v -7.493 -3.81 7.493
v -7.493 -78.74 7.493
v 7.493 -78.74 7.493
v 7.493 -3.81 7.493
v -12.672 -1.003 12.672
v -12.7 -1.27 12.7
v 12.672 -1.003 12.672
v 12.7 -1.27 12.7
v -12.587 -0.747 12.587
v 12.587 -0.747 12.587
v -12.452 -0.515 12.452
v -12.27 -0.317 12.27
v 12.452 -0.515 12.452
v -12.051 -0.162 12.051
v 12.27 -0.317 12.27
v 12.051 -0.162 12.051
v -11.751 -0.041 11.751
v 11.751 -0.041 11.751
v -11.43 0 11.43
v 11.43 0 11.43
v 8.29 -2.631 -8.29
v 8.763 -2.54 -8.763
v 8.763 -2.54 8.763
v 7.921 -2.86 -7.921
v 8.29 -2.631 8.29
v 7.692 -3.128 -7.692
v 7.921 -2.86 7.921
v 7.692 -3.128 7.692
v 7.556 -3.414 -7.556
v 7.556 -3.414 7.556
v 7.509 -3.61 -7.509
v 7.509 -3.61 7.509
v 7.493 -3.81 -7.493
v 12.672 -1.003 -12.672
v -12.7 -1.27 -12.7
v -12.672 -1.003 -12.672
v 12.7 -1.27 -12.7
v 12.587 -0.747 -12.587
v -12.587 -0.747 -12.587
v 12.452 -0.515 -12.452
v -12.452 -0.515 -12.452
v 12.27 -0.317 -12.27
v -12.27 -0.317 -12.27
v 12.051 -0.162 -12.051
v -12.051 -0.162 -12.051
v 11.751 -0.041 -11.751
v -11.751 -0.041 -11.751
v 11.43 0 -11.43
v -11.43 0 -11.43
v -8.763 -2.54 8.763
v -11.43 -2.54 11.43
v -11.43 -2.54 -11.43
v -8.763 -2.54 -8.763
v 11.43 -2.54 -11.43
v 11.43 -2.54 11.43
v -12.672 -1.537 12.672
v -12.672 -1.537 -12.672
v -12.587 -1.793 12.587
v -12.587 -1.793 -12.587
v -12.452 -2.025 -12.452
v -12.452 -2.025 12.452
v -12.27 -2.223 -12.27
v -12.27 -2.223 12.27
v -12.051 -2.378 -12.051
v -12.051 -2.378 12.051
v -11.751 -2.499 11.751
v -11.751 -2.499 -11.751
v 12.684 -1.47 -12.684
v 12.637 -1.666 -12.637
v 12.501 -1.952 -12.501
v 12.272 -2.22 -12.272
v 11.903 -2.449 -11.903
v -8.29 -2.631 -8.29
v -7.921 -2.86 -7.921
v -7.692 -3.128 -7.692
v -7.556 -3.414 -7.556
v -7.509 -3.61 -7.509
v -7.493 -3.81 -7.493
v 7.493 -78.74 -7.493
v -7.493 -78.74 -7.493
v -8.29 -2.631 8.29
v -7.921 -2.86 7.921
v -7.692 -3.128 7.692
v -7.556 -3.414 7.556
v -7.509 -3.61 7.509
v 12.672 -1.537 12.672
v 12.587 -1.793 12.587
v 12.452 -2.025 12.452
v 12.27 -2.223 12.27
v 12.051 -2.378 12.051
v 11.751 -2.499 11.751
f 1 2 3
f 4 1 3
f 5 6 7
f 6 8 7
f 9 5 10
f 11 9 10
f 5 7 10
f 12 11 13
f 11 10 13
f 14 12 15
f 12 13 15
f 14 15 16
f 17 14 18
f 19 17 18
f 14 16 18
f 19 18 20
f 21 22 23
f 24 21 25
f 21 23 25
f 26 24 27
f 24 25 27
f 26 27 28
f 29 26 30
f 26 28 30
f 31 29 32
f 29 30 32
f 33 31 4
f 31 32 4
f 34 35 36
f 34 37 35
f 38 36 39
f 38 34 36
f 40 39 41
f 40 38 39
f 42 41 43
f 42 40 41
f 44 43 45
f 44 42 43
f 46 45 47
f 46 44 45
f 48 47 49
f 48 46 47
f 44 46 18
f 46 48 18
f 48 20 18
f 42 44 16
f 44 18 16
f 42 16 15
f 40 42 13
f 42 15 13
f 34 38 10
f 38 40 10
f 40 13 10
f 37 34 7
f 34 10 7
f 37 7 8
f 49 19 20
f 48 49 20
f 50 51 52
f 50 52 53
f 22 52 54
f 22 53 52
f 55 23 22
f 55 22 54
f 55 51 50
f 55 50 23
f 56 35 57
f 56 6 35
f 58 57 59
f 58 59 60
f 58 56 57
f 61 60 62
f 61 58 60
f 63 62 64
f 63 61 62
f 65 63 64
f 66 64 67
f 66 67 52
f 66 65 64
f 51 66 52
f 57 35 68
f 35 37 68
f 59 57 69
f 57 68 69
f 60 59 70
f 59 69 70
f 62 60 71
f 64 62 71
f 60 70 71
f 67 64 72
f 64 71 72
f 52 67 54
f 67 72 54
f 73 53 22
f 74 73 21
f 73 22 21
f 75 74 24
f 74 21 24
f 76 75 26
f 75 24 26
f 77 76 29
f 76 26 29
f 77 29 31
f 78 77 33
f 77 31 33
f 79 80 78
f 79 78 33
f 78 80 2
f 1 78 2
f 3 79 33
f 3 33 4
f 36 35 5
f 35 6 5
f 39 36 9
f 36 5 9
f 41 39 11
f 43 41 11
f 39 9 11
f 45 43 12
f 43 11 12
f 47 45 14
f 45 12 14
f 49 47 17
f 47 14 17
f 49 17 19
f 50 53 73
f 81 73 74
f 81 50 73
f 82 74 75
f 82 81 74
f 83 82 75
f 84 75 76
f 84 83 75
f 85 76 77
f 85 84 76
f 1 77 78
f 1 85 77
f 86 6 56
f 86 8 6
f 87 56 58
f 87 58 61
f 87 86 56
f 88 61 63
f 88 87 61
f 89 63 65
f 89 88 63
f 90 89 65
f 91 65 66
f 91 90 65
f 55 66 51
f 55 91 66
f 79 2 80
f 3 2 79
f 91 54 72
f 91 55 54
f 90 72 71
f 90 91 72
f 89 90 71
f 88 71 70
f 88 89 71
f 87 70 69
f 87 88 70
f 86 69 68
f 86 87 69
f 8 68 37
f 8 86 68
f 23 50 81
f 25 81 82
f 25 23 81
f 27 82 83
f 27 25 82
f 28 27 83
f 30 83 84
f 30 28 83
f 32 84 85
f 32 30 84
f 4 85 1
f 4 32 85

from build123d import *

# Parameters (mm, degrees)
F0_W     = 25.4
F0_H     = 25.4
F1_DEPTH = 2.54
F2_W     = 14.986
F2_H     = 14.986
F3_DEPTH = 76.2
F4_R     = 1.26999


# Not quite as in the source:
# - a fillet or chamfer is up to 0.001 mm smaller than in the source, because OpenCascade refuses the exact size


with BuildPart() as f1:
    # F0 (on Front) → F1 (new body)
    with BuildSketch(Plane.XZ):
        Rectangle(F0_W, F0_H)
    extrude(amount=F1_DEPTH)

    # F2 (on face) → F3 (join)
    with BuildSketch(Plane.XZ.offset(2.54)):
        Rectangle(F2_W, F2_H)
    extrude(amount=F3_DEPTH)

    # F4 (radius 1.27 in the source; OpenCascade refuses exactly that, so slightly less here)
    f4_edges = [f1.edges().sort_by_distance(p)[0] for p in [
        (0, 0, 12.7),
        (-12.7, 0, 0),
        (0, 0, -12.7),
        (12.7, 0, 0),
        (0, -2.54, 12.7),
        (12.7, -2.54, 0),
        (-12.7, -2.54, 0),
        (0, -2.54, -12.7),
        (0, -2.54, 7.493),
        (-7.493, -2.54, 0),
        (0, -2.54, -7.493),
        (7.493, -2.54, 0),
    ]]
    fillet(f4_edges, radius=F4_R)


solid = f1.part
